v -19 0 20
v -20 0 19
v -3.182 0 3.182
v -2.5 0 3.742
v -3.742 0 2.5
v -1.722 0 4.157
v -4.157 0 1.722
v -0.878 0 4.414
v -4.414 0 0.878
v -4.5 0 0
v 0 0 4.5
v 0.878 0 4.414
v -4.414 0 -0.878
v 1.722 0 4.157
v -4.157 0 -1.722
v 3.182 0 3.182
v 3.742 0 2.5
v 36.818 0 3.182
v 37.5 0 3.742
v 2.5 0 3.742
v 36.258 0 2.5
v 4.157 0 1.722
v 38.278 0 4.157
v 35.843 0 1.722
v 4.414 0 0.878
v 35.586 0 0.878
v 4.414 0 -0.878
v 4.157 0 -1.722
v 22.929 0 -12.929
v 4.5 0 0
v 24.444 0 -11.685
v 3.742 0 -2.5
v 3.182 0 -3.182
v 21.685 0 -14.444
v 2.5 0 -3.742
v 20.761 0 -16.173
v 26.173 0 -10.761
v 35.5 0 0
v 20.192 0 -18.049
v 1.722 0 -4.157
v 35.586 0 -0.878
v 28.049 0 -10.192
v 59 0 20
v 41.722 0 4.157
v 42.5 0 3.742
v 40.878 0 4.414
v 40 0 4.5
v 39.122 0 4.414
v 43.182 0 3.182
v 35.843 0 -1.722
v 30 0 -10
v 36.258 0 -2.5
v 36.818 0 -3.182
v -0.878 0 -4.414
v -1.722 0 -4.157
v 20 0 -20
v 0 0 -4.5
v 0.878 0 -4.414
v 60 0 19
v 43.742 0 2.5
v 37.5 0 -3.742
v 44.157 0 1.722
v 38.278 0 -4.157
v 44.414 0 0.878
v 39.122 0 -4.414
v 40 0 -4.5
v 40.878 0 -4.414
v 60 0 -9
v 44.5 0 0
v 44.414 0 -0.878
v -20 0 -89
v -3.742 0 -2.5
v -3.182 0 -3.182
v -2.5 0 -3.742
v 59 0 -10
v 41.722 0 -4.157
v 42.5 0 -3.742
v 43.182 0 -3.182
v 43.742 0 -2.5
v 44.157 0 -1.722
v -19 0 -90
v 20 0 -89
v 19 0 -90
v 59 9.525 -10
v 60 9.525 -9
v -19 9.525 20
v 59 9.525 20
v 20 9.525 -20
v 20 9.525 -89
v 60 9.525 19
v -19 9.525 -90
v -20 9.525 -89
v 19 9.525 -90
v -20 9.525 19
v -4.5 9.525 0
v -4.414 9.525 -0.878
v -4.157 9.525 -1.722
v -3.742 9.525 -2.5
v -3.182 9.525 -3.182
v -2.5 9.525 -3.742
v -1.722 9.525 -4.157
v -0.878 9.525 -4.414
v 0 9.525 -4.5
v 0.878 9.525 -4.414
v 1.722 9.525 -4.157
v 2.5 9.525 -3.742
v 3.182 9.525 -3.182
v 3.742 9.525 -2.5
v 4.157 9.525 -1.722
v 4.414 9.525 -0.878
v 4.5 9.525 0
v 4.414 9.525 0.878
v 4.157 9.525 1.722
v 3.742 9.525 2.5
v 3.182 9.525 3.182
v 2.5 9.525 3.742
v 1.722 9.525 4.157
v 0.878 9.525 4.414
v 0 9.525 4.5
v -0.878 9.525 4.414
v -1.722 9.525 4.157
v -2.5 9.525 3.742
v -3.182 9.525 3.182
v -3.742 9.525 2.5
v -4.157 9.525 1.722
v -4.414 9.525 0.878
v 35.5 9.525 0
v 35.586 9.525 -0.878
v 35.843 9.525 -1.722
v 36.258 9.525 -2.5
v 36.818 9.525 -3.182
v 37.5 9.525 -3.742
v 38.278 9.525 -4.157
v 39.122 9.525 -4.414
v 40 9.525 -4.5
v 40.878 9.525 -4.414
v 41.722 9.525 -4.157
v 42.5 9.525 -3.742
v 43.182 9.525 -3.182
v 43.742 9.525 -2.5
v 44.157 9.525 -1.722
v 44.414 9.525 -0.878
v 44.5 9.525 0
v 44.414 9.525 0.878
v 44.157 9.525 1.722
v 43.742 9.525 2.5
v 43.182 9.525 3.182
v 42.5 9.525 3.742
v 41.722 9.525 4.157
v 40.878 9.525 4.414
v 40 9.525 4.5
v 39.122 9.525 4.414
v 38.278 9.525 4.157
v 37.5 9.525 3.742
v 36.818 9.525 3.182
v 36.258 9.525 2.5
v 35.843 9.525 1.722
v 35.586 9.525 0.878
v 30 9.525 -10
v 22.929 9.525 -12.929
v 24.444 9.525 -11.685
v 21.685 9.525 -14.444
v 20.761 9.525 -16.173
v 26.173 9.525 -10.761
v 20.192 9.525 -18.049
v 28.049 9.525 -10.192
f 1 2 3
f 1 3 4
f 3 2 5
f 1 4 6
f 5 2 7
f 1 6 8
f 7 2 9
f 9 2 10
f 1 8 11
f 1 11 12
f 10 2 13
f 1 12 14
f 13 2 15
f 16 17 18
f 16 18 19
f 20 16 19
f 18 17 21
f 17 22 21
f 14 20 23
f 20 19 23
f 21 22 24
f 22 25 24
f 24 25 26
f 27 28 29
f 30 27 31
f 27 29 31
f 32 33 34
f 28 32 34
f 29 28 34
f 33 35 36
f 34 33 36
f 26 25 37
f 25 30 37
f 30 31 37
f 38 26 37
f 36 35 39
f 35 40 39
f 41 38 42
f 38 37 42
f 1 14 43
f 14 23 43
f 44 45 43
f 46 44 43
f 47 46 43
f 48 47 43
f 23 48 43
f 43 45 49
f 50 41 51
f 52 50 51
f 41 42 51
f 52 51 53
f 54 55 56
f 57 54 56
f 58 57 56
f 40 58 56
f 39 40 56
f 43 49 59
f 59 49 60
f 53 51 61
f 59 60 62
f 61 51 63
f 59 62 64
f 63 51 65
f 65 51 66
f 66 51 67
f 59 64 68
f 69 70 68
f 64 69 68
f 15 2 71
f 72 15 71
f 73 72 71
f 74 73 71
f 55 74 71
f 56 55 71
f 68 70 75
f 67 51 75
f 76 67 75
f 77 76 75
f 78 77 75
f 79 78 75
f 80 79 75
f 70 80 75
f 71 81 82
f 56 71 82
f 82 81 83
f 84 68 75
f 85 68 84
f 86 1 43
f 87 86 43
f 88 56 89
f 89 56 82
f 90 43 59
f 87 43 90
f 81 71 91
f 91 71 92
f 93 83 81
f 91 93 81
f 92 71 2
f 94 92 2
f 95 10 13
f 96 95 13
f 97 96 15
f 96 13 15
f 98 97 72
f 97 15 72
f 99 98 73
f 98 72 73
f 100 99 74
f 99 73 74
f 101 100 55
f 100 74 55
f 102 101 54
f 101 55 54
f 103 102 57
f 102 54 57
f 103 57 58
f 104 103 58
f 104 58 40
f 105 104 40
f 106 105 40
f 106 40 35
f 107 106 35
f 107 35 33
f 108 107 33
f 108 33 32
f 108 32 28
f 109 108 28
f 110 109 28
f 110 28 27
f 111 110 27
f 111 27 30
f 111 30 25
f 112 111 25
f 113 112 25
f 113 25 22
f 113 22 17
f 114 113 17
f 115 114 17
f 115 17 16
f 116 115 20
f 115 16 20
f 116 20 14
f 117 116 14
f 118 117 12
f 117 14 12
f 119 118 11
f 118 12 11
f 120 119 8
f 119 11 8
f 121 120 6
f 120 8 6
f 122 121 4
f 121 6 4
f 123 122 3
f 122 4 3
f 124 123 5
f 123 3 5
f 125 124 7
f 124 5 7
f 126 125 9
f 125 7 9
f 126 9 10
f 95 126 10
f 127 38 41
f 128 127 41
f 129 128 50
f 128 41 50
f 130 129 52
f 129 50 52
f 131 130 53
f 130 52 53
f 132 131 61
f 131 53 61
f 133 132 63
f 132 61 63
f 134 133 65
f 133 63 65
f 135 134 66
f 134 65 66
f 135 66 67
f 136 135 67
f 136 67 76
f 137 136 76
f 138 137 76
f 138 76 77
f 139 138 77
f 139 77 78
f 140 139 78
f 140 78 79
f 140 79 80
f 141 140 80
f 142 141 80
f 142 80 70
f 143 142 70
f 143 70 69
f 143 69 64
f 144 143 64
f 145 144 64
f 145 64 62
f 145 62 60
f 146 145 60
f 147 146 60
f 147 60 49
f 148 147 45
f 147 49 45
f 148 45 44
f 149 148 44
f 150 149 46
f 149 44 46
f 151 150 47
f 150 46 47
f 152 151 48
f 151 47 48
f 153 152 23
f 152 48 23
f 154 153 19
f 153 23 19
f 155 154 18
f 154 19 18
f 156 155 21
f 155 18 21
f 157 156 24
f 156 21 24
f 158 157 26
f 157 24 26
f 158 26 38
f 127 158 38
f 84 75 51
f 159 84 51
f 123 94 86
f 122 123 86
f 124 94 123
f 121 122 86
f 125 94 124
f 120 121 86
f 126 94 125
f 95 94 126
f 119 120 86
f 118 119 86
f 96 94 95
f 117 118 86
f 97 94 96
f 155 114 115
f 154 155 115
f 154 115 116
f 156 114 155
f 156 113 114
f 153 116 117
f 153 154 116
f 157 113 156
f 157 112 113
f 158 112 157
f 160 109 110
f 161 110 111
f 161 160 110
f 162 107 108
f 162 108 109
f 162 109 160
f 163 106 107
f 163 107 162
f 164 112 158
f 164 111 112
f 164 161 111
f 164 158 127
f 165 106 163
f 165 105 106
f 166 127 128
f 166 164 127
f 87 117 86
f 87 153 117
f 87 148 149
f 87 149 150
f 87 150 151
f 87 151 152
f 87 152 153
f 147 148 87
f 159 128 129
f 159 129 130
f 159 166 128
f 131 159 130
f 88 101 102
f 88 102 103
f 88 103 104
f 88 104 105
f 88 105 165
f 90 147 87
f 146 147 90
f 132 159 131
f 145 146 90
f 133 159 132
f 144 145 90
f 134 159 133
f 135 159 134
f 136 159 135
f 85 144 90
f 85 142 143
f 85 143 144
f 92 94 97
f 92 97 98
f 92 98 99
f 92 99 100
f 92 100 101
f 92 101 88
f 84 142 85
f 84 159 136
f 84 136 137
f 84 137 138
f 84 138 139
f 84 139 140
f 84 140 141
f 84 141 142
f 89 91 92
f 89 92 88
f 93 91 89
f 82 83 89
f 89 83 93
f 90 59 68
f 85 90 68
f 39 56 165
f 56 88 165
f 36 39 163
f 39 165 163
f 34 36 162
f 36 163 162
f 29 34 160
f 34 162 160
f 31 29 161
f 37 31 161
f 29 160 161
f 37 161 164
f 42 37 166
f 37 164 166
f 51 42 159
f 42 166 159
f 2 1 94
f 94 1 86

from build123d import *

# Parameters (mm, degrees)
BOSS_EXTRUDE1_DEPTH  = 9.525
M8_CLEARANCE_HOLE1_D = 9
FILLET1_R            = 10
CHAMFER1_SIZE        = 1


with BuildPart() as part:
    # Sketch1 → Boss-Extrude1 (new body)
    with BuildSketch(Plane(origin=(0, 0, 0), x_dir=(1, 0, 0), z_dir=(0, 1, 0))):
        Polygon((-20, 90), (-20, -20), (60, -20), (60, 10), (20, 10), (20, 90), align=None)
    extrude(amount=BOSS_EXTRUDE1_DEPTH)

    # M8 Clearance Hole1 (through all)
    with Locations(Plane(origin=(0, 9.525, 0), x_dir=(1, 0, 0), z_dir=(0, 1, 0))):
        with Locations((0, 0), (40, 0)):
            Hole(M8_CLEARANCE_HOLE1_D / 2)

    # Fillet1
    fillet1_edges = [part.edges().sort_by_distance(p)[0] for p in [
        (20, 4.7625, -10),
    ]]
    fillet(fillet1_edges, radius=FILLET1_R)

    # Chamfer1
    chamfer1_edges = [part.edges().sort_by_distance(p)[0] for p in [
        (20, 4.7625, -90),
        (60, 4.7625, -10),
        (60, 4.7625, 20),
        (-20, 4.7625, 20),
        (-20, 4.7625, -90),
    ]]
    chamfer(chamfer1_edges, length=CHAMFER1_SIZE)


solid = part.part
